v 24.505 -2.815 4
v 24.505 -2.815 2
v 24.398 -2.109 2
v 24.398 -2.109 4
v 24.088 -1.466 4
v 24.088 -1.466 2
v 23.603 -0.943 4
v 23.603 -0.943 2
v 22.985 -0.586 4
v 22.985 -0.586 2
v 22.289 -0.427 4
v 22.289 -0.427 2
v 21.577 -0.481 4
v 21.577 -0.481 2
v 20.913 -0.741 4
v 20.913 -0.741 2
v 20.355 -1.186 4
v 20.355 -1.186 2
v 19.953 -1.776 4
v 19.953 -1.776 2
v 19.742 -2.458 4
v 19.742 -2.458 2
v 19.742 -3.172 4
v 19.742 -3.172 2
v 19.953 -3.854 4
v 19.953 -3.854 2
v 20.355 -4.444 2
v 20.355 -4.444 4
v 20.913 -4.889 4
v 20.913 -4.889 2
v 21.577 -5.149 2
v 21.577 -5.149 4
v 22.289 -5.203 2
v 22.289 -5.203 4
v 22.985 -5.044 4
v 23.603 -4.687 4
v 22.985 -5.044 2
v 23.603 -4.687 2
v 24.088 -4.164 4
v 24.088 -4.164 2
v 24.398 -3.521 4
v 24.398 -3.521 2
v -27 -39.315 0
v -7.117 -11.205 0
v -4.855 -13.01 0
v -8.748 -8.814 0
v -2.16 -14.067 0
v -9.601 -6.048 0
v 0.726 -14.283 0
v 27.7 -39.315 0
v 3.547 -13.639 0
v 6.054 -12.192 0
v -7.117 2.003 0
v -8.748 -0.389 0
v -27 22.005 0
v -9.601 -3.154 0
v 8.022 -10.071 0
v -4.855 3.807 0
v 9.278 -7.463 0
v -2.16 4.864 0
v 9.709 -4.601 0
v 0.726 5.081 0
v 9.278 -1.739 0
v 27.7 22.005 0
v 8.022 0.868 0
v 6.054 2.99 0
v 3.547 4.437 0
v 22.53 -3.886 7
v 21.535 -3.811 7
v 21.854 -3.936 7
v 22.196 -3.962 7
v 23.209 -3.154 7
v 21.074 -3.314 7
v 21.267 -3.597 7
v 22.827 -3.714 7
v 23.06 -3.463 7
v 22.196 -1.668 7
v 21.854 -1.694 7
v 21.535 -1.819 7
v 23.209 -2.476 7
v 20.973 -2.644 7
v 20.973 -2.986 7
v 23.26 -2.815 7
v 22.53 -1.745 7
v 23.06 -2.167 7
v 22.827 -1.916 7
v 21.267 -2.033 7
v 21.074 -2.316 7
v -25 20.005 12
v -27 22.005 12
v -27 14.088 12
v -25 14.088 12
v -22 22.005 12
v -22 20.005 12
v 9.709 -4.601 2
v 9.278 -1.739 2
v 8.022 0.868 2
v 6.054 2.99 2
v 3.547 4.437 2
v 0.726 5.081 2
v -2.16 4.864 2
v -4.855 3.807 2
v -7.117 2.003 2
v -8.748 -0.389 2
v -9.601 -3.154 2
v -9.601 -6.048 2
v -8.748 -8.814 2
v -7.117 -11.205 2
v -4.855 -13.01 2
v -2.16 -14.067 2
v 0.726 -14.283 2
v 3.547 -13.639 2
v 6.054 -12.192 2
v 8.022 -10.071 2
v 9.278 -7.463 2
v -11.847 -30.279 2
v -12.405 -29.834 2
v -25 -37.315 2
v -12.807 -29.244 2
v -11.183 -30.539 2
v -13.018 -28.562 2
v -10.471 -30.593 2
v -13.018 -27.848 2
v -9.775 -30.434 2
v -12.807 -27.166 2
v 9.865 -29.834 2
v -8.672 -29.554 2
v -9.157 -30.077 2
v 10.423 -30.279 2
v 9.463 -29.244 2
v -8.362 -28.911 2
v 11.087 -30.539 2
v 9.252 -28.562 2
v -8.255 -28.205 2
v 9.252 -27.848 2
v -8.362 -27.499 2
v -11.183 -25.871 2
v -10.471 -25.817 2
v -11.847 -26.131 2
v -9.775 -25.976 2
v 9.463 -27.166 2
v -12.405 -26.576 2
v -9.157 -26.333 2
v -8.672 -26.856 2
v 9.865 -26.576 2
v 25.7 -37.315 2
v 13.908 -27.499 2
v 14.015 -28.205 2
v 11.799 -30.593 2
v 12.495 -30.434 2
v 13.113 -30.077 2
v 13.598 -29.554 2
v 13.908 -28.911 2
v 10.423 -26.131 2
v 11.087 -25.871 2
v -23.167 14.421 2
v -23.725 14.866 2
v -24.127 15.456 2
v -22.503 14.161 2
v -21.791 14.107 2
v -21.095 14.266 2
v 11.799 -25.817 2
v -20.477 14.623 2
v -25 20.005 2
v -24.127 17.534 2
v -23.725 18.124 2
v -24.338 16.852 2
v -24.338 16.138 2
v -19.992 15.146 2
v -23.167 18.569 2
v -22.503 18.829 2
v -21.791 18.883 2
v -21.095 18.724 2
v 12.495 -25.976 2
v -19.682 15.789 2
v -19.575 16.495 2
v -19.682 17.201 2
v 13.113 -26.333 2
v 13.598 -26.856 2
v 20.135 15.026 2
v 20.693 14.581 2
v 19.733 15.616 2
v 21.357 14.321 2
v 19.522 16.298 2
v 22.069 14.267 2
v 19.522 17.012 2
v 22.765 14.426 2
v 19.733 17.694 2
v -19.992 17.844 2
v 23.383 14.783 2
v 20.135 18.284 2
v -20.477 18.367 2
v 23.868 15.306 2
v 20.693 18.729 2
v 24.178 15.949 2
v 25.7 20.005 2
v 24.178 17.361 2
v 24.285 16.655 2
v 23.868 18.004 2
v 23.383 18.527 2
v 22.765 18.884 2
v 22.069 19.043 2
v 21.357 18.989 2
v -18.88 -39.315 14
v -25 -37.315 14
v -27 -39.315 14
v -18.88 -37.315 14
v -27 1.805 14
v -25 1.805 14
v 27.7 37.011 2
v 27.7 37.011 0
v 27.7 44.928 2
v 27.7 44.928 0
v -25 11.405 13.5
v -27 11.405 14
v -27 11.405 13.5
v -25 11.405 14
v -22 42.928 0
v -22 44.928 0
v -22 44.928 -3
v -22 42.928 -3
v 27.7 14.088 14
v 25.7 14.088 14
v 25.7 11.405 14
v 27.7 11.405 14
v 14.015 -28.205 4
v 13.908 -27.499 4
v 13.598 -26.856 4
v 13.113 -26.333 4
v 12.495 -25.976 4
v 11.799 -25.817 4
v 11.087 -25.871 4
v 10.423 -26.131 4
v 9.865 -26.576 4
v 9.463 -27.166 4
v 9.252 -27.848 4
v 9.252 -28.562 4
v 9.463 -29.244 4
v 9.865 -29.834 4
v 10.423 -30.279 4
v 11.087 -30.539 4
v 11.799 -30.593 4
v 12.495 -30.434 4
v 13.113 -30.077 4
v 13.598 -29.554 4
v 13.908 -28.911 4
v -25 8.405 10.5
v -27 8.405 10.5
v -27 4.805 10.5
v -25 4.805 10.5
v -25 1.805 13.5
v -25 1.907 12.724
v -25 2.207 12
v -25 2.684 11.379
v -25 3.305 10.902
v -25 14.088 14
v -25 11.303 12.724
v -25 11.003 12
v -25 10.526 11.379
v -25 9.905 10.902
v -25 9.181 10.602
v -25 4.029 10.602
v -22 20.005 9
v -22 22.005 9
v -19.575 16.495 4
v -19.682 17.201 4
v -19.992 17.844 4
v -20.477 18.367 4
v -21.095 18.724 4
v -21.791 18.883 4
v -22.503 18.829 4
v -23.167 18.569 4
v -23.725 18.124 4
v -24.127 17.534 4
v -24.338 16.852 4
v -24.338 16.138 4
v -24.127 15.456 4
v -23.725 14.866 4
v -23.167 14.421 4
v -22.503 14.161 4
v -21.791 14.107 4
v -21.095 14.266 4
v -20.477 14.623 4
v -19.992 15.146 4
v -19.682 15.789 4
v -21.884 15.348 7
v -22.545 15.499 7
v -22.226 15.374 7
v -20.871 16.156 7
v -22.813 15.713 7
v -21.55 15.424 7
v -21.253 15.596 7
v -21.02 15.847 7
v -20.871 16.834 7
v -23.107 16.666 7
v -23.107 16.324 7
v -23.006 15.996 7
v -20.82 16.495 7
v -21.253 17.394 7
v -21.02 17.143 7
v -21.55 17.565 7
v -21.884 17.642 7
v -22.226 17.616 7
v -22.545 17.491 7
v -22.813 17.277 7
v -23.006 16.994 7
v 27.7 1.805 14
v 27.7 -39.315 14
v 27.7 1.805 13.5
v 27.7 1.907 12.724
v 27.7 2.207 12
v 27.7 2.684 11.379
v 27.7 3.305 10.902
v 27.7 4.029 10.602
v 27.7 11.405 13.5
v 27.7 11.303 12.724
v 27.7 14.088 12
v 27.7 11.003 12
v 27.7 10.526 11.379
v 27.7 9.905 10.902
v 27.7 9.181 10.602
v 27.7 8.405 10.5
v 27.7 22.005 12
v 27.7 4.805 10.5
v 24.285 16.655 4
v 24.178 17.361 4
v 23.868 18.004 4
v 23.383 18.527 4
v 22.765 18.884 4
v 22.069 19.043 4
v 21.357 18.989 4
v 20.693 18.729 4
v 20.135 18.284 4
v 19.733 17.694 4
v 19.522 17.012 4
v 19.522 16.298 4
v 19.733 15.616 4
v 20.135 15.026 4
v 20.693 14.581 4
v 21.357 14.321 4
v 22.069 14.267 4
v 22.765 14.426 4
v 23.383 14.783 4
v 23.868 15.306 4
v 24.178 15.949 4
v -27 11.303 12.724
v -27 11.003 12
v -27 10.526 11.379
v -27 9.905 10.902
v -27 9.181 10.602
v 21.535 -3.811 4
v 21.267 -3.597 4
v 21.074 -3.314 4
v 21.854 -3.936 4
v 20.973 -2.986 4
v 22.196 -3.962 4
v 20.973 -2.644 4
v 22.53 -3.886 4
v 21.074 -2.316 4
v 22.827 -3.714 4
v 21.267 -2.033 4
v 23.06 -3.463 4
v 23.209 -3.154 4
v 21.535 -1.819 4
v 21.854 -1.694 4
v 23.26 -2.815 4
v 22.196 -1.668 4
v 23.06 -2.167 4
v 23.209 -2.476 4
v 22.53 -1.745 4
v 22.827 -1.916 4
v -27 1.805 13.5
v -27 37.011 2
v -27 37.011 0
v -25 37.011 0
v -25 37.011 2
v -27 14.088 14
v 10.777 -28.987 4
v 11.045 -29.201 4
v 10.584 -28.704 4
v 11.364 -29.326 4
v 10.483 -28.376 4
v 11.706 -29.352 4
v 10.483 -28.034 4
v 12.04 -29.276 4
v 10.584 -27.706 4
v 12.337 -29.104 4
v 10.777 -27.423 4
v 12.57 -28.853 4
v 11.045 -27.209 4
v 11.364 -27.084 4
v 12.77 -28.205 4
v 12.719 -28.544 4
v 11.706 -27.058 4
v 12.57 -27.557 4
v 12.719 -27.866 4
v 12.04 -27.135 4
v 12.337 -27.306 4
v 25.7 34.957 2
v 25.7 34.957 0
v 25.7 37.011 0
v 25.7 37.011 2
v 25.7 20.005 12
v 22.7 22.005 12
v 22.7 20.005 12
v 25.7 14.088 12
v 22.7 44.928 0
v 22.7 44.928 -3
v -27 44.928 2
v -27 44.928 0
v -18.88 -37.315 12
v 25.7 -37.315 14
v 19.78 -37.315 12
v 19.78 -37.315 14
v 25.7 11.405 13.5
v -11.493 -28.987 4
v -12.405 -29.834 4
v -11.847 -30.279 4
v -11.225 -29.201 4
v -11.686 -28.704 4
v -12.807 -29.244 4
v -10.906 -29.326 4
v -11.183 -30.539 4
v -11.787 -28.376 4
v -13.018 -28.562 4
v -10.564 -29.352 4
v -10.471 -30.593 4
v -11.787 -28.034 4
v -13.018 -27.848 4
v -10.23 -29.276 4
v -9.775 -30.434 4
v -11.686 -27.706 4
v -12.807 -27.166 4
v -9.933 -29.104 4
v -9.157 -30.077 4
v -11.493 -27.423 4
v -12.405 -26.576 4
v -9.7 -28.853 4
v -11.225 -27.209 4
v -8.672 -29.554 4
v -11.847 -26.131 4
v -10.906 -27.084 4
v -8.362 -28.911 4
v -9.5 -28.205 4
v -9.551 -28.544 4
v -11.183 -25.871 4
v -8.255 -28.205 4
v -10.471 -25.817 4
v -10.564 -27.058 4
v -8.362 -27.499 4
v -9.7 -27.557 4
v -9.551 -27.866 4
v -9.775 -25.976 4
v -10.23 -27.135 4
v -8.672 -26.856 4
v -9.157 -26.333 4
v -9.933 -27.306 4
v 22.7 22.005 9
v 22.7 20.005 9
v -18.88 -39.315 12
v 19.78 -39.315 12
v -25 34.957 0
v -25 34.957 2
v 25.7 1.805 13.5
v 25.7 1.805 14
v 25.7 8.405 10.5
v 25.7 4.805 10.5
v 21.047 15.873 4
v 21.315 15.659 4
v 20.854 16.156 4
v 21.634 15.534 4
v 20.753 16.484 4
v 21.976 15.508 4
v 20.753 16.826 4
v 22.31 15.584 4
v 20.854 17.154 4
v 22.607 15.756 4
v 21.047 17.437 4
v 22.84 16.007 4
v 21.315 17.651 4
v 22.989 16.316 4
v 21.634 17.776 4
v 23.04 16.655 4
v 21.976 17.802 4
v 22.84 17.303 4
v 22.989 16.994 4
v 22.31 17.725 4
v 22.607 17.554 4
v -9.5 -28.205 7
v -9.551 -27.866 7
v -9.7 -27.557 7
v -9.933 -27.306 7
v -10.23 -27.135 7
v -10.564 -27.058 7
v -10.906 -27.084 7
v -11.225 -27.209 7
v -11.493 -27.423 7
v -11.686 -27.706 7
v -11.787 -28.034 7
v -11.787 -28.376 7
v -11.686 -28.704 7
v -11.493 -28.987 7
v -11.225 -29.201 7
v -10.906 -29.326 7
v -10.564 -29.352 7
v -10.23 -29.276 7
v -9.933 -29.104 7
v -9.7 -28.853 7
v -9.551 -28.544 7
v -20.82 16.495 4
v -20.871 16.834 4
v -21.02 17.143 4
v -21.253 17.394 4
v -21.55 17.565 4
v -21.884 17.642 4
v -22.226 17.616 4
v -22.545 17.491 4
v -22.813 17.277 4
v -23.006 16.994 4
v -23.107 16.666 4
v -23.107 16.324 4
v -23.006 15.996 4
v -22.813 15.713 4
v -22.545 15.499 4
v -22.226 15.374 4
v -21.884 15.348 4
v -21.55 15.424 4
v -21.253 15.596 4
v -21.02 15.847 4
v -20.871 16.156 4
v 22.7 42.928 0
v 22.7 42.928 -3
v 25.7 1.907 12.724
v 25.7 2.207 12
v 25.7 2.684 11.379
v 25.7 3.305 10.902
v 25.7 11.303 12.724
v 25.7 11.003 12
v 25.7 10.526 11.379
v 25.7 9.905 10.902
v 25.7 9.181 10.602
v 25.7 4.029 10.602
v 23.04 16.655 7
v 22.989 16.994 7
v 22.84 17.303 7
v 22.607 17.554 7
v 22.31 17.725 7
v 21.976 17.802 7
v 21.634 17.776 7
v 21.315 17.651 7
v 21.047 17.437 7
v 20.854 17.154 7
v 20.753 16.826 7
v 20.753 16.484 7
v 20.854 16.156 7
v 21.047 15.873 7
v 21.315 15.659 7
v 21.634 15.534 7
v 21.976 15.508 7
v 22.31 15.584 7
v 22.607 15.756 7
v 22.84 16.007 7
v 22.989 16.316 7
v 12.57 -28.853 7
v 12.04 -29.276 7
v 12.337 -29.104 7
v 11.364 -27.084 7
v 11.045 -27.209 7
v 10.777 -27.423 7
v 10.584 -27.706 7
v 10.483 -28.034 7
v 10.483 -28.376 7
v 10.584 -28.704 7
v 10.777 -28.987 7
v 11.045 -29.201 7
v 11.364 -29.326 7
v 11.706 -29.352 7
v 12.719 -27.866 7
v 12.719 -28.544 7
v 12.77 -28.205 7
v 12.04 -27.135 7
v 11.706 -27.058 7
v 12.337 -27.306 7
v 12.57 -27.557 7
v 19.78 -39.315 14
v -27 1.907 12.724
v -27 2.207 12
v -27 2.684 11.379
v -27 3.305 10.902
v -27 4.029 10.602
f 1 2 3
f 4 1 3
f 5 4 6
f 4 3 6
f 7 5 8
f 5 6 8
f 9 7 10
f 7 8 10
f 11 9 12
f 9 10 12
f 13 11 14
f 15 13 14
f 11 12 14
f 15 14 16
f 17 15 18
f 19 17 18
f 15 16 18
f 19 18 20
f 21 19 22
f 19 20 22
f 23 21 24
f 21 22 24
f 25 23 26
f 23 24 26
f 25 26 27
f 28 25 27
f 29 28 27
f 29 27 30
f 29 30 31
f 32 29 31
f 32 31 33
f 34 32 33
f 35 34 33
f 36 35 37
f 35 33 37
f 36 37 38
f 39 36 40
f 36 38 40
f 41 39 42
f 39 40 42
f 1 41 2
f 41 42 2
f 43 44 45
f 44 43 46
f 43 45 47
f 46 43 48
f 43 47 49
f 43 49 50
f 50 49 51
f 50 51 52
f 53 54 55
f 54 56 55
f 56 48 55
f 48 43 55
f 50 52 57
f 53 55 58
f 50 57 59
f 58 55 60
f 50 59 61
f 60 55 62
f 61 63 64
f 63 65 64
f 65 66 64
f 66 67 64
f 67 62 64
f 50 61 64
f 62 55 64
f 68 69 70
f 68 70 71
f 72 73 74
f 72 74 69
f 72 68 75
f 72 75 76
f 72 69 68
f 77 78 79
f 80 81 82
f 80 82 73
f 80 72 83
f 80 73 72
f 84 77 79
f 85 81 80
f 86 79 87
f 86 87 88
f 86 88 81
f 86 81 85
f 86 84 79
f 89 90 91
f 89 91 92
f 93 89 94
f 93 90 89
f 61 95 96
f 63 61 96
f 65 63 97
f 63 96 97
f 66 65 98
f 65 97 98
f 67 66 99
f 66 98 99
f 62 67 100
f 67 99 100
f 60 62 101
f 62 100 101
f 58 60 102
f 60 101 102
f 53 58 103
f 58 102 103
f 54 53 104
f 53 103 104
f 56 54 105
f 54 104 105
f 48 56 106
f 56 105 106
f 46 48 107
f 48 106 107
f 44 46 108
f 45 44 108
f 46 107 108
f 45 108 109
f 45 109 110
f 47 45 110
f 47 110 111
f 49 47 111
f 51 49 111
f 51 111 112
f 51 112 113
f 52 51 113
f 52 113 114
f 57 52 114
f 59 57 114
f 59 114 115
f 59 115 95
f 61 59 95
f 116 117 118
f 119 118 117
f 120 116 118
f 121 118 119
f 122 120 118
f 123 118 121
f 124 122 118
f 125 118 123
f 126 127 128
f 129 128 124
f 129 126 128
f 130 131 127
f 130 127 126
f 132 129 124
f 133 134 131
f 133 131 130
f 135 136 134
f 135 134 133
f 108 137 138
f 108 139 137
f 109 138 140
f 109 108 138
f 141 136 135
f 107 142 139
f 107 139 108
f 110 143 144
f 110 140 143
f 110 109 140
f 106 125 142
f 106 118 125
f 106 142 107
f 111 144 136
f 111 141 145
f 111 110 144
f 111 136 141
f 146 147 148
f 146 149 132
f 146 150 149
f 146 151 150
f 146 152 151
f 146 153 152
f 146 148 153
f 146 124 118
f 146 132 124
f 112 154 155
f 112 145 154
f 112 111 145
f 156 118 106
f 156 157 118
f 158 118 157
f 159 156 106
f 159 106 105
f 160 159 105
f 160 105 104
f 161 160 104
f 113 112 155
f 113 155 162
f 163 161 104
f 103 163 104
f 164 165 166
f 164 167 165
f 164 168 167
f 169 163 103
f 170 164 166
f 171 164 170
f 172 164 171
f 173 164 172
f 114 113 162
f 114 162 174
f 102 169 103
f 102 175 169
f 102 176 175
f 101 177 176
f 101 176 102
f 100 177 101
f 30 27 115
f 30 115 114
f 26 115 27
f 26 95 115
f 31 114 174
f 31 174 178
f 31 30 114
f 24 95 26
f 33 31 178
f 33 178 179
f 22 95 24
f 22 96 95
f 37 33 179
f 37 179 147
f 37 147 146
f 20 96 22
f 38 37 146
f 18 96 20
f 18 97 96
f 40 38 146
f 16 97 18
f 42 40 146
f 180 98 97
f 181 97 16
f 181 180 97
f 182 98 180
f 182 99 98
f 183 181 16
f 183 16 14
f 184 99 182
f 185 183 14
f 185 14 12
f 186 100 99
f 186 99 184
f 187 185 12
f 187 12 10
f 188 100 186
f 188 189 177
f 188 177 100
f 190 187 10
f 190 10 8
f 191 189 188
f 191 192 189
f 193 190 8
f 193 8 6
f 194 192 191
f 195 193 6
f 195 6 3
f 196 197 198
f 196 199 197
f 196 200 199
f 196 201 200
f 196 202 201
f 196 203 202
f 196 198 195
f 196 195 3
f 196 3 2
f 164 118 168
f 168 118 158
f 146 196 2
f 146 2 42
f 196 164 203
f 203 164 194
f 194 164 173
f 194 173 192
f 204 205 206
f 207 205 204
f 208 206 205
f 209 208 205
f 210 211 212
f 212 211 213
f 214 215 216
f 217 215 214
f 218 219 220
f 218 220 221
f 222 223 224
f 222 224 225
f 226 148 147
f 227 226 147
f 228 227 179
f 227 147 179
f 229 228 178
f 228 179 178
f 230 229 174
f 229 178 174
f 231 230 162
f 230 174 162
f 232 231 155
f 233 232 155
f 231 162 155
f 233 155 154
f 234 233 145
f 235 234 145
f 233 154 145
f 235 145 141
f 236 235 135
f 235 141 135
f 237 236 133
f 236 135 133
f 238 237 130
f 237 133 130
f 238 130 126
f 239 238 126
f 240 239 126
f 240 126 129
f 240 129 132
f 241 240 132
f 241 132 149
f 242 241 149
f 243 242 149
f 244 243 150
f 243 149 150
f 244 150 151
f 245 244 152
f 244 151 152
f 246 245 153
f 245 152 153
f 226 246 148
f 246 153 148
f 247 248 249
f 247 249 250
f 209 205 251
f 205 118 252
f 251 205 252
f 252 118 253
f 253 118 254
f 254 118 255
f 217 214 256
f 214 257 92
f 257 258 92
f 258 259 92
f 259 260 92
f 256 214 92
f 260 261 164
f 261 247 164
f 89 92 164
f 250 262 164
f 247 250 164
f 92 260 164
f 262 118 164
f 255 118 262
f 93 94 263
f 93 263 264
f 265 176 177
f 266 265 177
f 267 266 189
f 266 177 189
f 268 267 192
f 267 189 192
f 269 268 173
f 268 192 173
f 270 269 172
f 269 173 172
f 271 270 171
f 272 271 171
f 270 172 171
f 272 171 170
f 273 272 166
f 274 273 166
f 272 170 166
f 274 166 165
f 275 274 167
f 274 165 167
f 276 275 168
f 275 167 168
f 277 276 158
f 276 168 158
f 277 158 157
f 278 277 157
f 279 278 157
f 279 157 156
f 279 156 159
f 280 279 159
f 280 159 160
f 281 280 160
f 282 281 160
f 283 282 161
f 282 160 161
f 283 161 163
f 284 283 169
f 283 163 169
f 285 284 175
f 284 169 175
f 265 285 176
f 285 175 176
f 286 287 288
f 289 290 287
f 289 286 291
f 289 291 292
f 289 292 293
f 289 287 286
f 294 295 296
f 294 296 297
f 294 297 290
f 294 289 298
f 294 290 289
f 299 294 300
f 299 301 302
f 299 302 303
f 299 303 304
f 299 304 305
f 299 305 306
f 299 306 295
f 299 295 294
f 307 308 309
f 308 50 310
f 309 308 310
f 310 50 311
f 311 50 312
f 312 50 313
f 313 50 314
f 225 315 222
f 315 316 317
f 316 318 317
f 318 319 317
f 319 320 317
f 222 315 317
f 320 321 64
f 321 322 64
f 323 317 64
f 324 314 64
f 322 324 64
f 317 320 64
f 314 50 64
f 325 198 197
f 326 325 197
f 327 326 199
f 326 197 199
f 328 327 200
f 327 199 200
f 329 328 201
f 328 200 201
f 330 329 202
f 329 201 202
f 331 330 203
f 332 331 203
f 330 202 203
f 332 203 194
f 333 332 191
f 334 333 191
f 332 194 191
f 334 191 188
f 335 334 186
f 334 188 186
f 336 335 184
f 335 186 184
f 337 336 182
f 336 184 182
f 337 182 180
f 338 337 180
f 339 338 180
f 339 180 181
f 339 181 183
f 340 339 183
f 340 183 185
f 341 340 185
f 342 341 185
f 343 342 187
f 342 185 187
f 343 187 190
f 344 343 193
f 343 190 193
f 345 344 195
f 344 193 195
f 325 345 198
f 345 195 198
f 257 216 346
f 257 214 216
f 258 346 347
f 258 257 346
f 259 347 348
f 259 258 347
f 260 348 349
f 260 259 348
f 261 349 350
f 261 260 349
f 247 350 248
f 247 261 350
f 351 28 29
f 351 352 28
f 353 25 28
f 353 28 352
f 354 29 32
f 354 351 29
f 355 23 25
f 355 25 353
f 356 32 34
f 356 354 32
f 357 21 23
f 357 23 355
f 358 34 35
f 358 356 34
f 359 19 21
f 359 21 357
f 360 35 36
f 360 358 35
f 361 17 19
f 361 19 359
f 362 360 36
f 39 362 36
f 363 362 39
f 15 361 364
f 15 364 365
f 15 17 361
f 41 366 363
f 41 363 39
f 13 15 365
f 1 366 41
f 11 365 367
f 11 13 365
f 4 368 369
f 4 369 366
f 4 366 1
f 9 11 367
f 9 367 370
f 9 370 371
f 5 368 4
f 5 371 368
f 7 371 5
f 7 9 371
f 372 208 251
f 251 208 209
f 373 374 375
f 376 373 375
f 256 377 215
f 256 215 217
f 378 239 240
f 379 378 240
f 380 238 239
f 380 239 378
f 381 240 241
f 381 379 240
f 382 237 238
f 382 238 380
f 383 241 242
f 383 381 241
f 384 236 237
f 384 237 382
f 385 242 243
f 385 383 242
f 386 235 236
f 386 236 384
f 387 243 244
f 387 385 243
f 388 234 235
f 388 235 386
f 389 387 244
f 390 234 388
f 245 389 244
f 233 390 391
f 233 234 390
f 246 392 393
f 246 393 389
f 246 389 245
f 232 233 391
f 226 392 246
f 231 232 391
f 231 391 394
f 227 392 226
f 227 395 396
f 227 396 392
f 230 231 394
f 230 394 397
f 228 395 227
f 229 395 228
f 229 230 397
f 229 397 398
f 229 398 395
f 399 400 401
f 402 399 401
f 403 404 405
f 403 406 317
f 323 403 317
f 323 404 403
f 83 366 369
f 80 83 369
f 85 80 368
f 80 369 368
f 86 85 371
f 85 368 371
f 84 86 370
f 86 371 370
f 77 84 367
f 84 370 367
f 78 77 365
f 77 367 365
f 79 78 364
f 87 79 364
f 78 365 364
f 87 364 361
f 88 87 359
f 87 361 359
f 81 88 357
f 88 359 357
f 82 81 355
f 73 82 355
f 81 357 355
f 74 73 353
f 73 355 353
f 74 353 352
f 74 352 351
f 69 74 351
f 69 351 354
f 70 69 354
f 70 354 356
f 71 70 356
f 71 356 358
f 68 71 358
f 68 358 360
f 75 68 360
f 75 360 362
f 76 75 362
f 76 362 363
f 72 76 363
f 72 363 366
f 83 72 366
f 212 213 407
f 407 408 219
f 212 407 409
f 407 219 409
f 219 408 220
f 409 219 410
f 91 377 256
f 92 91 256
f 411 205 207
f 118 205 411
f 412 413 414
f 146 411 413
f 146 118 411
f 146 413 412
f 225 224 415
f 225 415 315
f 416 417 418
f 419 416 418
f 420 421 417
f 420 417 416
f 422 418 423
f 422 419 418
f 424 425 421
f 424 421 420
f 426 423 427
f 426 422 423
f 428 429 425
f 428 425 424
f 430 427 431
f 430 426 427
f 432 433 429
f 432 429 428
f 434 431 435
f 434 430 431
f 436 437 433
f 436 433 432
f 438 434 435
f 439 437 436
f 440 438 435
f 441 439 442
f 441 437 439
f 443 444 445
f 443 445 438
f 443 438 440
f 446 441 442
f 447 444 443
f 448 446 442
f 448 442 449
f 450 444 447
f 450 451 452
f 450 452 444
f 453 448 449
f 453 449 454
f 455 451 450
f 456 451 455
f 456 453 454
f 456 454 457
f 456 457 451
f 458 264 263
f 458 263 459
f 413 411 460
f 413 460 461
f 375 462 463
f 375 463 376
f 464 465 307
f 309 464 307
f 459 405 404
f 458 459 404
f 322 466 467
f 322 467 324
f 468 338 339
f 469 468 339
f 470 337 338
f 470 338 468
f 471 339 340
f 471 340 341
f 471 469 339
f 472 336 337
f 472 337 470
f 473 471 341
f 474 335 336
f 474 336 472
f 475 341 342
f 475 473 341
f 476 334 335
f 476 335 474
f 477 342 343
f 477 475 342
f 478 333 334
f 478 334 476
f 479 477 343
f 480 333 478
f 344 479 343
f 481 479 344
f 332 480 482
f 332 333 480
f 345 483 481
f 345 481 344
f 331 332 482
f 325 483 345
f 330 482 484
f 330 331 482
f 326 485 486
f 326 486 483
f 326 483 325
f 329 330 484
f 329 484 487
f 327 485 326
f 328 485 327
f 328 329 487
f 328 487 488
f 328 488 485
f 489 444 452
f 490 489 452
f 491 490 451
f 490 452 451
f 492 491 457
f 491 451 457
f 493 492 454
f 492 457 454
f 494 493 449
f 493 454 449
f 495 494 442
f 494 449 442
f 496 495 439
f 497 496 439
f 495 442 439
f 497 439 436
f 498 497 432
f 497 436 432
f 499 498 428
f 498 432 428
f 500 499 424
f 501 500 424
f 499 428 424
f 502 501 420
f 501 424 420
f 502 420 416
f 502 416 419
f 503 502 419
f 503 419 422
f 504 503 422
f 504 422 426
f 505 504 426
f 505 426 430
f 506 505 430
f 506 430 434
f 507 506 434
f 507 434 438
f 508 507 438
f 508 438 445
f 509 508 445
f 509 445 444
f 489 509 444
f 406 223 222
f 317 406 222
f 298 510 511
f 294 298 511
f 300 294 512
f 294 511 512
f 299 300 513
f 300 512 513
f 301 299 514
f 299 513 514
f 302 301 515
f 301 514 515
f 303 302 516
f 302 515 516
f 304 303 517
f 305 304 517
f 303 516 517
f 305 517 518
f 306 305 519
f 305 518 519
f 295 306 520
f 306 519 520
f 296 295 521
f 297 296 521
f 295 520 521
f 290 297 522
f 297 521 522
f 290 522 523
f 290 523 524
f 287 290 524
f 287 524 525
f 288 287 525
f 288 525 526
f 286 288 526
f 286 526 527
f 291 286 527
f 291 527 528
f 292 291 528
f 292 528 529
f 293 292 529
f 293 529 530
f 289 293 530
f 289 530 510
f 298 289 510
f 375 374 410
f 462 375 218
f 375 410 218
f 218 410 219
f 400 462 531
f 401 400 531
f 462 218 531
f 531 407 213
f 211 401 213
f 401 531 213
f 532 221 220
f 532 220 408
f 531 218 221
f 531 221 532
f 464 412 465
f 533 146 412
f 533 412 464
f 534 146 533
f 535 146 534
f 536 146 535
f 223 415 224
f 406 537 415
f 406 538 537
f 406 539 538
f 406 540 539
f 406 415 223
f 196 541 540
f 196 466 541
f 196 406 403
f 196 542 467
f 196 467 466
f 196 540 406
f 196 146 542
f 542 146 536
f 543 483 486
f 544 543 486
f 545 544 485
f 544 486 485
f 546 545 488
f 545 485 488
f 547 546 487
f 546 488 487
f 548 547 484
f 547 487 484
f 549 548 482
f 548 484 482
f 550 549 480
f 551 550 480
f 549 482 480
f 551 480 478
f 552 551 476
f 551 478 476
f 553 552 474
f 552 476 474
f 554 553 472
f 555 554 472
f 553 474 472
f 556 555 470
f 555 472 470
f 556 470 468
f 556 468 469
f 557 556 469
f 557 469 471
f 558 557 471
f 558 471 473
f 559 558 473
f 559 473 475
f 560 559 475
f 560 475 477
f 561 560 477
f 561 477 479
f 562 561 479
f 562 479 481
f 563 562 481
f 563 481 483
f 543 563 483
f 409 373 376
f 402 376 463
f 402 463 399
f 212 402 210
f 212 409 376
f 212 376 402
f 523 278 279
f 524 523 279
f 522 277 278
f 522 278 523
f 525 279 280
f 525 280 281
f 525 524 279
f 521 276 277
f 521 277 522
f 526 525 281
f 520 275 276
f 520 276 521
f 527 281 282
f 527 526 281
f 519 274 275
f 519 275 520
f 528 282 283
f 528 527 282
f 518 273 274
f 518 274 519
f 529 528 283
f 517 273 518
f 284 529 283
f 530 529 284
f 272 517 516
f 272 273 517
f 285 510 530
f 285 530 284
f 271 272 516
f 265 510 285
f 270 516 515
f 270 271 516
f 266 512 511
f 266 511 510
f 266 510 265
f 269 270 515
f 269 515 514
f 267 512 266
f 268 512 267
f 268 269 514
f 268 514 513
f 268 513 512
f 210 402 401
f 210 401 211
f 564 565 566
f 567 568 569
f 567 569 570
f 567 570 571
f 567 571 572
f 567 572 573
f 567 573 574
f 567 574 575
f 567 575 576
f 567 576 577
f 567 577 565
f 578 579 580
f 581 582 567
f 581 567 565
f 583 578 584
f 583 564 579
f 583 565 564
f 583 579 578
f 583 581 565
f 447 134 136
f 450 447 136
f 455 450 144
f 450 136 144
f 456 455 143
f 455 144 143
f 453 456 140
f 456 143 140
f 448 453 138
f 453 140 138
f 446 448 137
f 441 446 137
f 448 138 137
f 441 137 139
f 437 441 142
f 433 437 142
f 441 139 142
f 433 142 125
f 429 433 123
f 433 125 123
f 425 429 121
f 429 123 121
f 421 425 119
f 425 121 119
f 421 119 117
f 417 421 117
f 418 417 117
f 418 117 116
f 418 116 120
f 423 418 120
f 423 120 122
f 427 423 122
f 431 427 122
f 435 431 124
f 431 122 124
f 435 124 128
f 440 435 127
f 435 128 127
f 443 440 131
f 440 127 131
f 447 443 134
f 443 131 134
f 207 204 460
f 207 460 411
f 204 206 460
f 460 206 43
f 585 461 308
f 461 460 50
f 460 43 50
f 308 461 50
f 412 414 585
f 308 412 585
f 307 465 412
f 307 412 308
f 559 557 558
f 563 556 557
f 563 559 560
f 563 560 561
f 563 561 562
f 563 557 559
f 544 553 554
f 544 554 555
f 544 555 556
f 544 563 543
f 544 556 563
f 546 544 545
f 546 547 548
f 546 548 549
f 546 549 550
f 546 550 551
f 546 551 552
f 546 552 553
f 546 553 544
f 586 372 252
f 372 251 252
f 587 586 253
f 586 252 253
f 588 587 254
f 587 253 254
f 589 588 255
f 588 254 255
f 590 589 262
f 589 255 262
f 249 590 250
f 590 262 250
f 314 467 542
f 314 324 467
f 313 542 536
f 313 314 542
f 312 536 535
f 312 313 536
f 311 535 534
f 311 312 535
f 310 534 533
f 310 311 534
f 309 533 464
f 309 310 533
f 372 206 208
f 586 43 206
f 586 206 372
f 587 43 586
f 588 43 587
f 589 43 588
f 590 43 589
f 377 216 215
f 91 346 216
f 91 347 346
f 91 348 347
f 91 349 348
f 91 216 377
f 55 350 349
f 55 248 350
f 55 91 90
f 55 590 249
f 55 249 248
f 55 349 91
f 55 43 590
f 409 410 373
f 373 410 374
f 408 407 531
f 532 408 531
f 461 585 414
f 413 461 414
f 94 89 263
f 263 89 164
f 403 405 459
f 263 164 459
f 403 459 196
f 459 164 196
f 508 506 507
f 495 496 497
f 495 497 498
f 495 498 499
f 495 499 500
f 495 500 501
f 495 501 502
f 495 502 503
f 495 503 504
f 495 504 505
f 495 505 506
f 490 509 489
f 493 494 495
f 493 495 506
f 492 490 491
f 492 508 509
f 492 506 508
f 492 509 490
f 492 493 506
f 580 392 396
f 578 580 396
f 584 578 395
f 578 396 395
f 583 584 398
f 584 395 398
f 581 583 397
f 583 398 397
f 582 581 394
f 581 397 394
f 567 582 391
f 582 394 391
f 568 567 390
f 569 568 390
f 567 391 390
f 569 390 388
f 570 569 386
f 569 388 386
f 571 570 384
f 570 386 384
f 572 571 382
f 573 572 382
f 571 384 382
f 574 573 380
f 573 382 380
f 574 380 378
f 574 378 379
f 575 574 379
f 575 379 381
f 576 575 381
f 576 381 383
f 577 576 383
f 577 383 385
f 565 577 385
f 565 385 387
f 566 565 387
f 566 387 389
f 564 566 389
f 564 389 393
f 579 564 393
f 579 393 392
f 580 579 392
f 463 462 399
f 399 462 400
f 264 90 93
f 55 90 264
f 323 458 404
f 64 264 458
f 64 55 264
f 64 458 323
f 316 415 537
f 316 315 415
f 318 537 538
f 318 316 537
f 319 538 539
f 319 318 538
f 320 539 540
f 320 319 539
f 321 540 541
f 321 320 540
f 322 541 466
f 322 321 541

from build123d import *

# Parameters (mm, degrees)
F0_W      = 54.7
F0_H      = 61.32
F0_W_2    = 50.7
F0_H_2    = 57.32
F1_DEPTH  = 14
F2_DEPTH  = 2
F3_R      = 1.15
F4_DEPTH  = 5
F5_R      = 2.3945032788
F6_DEPTH  = 2
F7_W      = 2
F7_H      = 9.6
F8_DEPTH  = 3.5
F9_R      = 3
F10_W     = 2
F10_H     = 9.6
F11_DEPTH = 3.5
F12_R     = 3
F13_W     = 38.66
F13_H     = 2
F14_DEPTH = 2
F15_W     = 54.7
F15_H     = 7.9171418053
F16_DEPTH = 2
F17_W     = 50.7
F17_H     = 2.05323
F18_DEPTH = 2
F19_W     = 44.7
F19_H     = 2
F20_DEPTH = 3
F21_W     = 44.7
F21_H     = 2
F22_DEPTH = 3
F23_R     = 9.7091406399
F24_DEPTH = 3


with BuildPart() as f1:
    # F0 (on Top) → F1 (new body)
    with BuildSketch(Plane.XY):
        with Locations((0.3500037253, -8.655007627)):
            Rectangle(F0_W, F0_H)
        with Locations((0.3500037253, -8.655007627)):
            Rectangle(F0_W_2, F0_H_2, mode=Mode.SUBTRACT)
    extrude(amount=F1_DEPTH)

    # F0 (on Top) → F2 (join)
    with BuildSketch(Plane.XY):
        with Locations((0.3500037253, -8.655007627)):
            Rectangle(F0_W_2, F0_H_2)
    extrude(amount=F2_DEPTH)

    # F3 (on face) → F4 (join)
    with BuildSketch(Plane.XY.offset(2)):
        with Locations((21.8900037253, 16.654992373)):
            Circle(F3_R)
        with Locations((-21.9699962747, 16.494992373)):
            Circle(F3_R)
        with Locations((22.1100037253, -2.815007627)):
            Circle(F3_R)
        with Locations((11.6200037253, -28.205007627)):
            Circle(F3_R)
        with Locations((-10.6499962747, -28.205007627)):
            Circle(F3_R)
    extrude(amount=F4_DEPTH)

    # F5 (on face) → F6 (join)
    with BuildSketch(Plane.XY.offset(2)):
        with Locations((-10.6499962747, -28.205007627)):
            Circle(F5_R)
        with Locations((11.6200037253, -28.205007627)):
            Circle(F5_R)
        with Locations((22.1100037253, -2.815007627)):
            Circle(F5_R)
        with Locations((21.8900037253, 16.654992373)):
            Circle(F5_R)
        with Locations((-21.9699962747, 16.494992373)):
            Circle(F5_R)
    extrude(amount=F6_DEPTH)

    # F7 (on face) → F8 (cut)
    with BuildSketch(Plane.XY.offset(14)):
        with Locations((26.7000037253, 6.604992373)):
            Rectangle(F7_W, F7_H)
    extrude(amount=-F8_DEPTH, mode=Mode.SUBTRACT)

    # F9
    f9_edges = [f1.edges().sort_by_distance(p)[0] for p in [
        (26.700004, 11.404992, 10.5),
        (26.700004, 1.804992, 10.5),
    ]]
    fillet(f9_edges, radius=F9_R)

    # F10 (on face) → F11 (cut)
    with BuildSketch(Plane.XY.offset(14)):
        with Locations((-25.9999962747, 6.604992373)):
            Rectangle(F10_W, F10_H)
    extrude(amount=-F11_DEPTH, mode=Mode.SUBTRACT)

    # F12
    f12_edges = [f1.edges().sort_by_distance(p)[0] for p in [
        (-25.999996, 11.404992, 10.5),
        (-25.999996, 1.804992, 10.5),
    ]]
    fillet(f12_edges, radius=F12_R)

    # F13 (on face) → F14 (cut)
    with BuildSketch(Plane.XY.offset(14)):
        with Locations((0.4500037253, -38.315007627)):
            Rectangle(F13_W, F13_H)
    extrude(amount=-F14_DEPTH, mode=Mode.SUBTRACT)

    # F15 (on face) → F16 (cut)
    with BuildSketch(Plane.XY.offset(14)):
        with Locations((0.3500037253, 18.0464214703)):
            Rectangle(F15_W, F15_H)
    extrude(amount=-F16_DEPTH, mode=Mode.SUBTRACT)

    # F21 (on face) → F22 (cut)
    with BuildSketch(Plane.XY.offset(12)):
        with Locations((0.3500037253, 21.004992373)):
            Rectangle(F21_W, F21_H)
    extrude(amount=-F22_DEPTH, mode=Mode.SUBTRACT)

    # F23 (on face) → F24 (cut)
    with BuildSketch(Plane.XY.offset(2)):
        with Locations((0, -4.6012587845)):
            Circle(F23_R)
    extrude(amount=-F24_DEPTH, mode=Mode.SUBTRACT)


with BuildPart() as f18:
    # F17 (on Top) → F18 (new body)
    with BuildSketch(Plane.XY):
        Polygon((27.7000037253, 44.9277027175), (-26.9999962747, 44.9277027175), (-26.9999962747, 37.0107027175), (-24.9999962747, 37.0107027175), (25.7000037253, 37.0107027175), (27.7000037253, 37.0107027175), align=None)
        with Locations((0.3500037253, 35.9840877175)):
            Rectangle(F17_W, F17_H)
    extrude(amount=F18_DEPTH)

    # F19 (on face) → F20 (join)
    with BuildSketch(Plane(origin=(0, 0, 0), x_dir=(1, 0, 0), z_dir=(0, 0, -1))):
        with Locations((0.3500037253, -43.9277027175)):
            Rectangle(F19_W, F19_H)
    extrude(amount=F20_DEPTH)


solid = Compound([f1.part, f18.part])
